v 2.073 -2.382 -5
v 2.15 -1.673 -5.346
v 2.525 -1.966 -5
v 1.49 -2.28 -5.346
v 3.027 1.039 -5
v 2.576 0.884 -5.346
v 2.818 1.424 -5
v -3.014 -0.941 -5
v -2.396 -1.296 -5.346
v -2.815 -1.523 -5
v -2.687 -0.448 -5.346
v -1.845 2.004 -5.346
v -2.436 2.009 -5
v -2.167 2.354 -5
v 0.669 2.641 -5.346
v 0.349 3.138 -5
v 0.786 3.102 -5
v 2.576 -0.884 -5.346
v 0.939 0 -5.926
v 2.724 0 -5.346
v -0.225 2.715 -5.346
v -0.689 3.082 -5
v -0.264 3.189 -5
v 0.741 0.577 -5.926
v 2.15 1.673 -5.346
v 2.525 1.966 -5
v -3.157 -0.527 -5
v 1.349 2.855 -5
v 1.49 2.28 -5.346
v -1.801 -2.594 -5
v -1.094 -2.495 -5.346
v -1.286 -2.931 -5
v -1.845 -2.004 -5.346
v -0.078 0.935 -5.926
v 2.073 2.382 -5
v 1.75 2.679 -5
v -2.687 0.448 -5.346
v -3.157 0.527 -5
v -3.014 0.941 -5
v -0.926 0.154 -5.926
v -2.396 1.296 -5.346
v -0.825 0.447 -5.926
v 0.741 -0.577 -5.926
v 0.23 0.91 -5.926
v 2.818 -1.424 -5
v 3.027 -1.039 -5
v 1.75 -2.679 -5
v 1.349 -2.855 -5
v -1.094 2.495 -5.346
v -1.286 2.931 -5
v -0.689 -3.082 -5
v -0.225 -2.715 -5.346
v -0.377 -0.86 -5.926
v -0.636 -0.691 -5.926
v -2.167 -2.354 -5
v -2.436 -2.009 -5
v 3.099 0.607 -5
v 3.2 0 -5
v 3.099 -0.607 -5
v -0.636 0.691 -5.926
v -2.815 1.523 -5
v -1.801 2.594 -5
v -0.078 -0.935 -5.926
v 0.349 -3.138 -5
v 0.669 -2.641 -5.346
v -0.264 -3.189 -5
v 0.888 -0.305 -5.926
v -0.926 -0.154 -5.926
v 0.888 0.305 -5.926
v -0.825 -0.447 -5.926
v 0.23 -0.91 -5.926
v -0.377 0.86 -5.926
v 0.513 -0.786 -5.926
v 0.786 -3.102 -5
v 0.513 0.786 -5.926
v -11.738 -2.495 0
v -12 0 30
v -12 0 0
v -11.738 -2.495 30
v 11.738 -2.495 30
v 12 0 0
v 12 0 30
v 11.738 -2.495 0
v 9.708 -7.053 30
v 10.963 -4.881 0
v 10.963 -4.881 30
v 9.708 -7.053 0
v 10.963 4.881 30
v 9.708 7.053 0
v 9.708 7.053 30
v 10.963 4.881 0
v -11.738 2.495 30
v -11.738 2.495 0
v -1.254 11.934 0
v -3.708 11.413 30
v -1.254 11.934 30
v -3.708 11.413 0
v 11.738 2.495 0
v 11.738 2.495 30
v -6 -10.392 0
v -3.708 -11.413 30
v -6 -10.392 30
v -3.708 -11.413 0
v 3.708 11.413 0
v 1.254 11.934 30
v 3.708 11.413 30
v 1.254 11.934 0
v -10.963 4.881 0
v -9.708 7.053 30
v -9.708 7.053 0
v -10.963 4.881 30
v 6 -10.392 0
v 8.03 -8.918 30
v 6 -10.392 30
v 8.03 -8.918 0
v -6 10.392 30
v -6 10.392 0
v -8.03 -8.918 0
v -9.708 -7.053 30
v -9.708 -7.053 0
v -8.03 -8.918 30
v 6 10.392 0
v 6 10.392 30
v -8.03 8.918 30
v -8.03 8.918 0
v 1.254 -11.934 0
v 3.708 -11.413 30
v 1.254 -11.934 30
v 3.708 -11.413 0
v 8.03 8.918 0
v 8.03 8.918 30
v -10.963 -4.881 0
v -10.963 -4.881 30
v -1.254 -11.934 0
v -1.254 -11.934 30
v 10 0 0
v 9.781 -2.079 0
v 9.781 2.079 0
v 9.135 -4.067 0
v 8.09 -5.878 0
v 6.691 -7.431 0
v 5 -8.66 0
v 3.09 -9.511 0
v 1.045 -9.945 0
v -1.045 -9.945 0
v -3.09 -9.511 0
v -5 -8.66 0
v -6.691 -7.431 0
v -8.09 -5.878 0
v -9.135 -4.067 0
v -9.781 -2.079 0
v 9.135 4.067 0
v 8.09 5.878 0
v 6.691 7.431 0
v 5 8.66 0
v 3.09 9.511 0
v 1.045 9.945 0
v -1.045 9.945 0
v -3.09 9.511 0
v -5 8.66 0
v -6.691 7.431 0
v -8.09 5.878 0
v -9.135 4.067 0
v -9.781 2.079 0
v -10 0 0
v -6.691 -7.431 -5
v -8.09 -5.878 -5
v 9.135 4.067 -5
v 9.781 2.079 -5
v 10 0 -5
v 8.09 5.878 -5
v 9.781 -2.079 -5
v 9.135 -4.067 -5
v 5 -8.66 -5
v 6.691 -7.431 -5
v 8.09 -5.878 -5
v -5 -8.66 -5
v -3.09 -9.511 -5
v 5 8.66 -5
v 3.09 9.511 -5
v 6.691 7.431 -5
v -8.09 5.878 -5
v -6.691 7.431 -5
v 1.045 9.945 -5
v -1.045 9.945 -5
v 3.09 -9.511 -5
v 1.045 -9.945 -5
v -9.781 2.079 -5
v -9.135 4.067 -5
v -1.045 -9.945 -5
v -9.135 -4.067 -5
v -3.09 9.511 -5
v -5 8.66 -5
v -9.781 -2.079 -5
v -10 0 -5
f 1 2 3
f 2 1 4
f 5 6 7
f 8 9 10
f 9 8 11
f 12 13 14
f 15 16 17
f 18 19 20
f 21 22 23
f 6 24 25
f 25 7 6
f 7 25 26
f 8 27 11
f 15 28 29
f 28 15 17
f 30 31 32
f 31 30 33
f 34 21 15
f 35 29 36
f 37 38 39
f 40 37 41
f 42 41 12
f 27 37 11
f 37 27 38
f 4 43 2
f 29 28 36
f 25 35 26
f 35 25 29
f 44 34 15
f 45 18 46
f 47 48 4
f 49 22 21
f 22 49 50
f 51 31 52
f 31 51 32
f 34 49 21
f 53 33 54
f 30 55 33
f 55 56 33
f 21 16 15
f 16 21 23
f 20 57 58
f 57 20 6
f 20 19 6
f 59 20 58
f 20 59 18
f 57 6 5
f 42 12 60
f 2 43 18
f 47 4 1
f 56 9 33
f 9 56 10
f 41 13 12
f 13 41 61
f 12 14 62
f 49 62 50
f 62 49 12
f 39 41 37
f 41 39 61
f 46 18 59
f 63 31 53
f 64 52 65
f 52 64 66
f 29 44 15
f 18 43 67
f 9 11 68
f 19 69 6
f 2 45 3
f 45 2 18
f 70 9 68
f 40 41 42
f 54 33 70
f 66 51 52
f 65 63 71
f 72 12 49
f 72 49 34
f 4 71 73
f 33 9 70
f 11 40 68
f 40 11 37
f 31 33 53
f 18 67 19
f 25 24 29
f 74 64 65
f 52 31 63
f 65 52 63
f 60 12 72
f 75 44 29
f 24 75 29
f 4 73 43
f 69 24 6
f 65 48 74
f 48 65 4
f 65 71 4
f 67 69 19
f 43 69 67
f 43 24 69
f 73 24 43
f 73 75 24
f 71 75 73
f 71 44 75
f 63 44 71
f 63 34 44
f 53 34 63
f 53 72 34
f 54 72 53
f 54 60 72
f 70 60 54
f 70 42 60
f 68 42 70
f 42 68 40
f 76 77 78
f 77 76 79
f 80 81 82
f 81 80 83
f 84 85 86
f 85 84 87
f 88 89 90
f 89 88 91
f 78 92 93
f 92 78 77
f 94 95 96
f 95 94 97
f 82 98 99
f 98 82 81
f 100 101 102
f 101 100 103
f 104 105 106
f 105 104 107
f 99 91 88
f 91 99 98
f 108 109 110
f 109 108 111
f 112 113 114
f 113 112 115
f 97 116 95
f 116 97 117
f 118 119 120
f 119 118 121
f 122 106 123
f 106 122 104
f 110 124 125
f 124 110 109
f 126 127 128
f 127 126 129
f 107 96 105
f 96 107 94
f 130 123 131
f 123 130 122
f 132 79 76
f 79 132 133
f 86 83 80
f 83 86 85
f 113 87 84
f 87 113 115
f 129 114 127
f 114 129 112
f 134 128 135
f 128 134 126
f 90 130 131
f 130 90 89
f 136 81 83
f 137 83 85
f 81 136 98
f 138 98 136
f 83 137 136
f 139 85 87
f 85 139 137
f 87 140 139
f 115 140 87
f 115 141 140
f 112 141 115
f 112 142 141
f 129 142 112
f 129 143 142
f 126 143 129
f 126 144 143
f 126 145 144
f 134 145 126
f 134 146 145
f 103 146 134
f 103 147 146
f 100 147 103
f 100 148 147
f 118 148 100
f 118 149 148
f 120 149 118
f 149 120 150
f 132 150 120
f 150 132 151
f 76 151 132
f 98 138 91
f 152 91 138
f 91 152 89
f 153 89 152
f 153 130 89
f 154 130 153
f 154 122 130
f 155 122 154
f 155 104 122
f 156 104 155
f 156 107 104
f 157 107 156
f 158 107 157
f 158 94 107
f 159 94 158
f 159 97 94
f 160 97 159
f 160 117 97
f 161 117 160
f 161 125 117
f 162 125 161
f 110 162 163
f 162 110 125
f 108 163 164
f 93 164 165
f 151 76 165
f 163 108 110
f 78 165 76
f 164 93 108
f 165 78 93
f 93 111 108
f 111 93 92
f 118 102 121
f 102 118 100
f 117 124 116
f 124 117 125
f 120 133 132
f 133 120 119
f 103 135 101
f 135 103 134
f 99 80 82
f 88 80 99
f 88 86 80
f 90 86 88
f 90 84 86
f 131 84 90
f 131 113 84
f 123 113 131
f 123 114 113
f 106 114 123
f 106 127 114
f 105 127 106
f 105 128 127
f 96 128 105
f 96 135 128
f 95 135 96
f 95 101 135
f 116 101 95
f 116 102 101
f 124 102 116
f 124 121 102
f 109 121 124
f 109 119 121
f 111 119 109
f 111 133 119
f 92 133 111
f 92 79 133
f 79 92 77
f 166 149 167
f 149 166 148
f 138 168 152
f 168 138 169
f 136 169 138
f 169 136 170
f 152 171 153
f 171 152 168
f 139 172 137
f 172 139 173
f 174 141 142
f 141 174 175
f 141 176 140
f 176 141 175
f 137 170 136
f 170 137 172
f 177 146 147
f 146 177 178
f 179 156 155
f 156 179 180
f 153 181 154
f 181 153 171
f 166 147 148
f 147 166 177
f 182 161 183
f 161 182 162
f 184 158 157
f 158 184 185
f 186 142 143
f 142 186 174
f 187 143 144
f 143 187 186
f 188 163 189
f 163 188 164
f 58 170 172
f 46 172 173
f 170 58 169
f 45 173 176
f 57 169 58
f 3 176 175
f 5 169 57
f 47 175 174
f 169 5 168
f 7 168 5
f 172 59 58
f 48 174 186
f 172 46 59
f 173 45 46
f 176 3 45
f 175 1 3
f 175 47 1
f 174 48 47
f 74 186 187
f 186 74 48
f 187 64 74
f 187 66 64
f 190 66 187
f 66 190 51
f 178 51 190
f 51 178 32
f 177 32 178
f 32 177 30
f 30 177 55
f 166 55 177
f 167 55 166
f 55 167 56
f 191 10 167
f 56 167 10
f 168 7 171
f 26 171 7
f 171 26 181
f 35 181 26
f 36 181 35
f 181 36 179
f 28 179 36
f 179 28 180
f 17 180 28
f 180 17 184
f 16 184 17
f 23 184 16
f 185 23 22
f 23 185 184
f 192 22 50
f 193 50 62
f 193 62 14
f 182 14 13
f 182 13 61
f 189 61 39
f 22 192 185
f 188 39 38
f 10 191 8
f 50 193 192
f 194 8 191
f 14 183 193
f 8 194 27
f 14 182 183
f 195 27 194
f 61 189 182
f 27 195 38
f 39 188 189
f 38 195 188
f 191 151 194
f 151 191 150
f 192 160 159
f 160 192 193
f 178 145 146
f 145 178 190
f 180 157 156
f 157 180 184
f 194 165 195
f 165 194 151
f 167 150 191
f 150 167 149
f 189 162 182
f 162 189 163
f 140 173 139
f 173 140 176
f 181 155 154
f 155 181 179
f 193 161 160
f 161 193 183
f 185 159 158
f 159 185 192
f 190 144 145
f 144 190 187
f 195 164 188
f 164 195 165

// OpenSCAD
// Generated by generate_scads.py
union() {
  sphere(r=6);
  cylinder(h=30, r=12, center=false);
  cylinder(h=10, r=10, center=true);
}
